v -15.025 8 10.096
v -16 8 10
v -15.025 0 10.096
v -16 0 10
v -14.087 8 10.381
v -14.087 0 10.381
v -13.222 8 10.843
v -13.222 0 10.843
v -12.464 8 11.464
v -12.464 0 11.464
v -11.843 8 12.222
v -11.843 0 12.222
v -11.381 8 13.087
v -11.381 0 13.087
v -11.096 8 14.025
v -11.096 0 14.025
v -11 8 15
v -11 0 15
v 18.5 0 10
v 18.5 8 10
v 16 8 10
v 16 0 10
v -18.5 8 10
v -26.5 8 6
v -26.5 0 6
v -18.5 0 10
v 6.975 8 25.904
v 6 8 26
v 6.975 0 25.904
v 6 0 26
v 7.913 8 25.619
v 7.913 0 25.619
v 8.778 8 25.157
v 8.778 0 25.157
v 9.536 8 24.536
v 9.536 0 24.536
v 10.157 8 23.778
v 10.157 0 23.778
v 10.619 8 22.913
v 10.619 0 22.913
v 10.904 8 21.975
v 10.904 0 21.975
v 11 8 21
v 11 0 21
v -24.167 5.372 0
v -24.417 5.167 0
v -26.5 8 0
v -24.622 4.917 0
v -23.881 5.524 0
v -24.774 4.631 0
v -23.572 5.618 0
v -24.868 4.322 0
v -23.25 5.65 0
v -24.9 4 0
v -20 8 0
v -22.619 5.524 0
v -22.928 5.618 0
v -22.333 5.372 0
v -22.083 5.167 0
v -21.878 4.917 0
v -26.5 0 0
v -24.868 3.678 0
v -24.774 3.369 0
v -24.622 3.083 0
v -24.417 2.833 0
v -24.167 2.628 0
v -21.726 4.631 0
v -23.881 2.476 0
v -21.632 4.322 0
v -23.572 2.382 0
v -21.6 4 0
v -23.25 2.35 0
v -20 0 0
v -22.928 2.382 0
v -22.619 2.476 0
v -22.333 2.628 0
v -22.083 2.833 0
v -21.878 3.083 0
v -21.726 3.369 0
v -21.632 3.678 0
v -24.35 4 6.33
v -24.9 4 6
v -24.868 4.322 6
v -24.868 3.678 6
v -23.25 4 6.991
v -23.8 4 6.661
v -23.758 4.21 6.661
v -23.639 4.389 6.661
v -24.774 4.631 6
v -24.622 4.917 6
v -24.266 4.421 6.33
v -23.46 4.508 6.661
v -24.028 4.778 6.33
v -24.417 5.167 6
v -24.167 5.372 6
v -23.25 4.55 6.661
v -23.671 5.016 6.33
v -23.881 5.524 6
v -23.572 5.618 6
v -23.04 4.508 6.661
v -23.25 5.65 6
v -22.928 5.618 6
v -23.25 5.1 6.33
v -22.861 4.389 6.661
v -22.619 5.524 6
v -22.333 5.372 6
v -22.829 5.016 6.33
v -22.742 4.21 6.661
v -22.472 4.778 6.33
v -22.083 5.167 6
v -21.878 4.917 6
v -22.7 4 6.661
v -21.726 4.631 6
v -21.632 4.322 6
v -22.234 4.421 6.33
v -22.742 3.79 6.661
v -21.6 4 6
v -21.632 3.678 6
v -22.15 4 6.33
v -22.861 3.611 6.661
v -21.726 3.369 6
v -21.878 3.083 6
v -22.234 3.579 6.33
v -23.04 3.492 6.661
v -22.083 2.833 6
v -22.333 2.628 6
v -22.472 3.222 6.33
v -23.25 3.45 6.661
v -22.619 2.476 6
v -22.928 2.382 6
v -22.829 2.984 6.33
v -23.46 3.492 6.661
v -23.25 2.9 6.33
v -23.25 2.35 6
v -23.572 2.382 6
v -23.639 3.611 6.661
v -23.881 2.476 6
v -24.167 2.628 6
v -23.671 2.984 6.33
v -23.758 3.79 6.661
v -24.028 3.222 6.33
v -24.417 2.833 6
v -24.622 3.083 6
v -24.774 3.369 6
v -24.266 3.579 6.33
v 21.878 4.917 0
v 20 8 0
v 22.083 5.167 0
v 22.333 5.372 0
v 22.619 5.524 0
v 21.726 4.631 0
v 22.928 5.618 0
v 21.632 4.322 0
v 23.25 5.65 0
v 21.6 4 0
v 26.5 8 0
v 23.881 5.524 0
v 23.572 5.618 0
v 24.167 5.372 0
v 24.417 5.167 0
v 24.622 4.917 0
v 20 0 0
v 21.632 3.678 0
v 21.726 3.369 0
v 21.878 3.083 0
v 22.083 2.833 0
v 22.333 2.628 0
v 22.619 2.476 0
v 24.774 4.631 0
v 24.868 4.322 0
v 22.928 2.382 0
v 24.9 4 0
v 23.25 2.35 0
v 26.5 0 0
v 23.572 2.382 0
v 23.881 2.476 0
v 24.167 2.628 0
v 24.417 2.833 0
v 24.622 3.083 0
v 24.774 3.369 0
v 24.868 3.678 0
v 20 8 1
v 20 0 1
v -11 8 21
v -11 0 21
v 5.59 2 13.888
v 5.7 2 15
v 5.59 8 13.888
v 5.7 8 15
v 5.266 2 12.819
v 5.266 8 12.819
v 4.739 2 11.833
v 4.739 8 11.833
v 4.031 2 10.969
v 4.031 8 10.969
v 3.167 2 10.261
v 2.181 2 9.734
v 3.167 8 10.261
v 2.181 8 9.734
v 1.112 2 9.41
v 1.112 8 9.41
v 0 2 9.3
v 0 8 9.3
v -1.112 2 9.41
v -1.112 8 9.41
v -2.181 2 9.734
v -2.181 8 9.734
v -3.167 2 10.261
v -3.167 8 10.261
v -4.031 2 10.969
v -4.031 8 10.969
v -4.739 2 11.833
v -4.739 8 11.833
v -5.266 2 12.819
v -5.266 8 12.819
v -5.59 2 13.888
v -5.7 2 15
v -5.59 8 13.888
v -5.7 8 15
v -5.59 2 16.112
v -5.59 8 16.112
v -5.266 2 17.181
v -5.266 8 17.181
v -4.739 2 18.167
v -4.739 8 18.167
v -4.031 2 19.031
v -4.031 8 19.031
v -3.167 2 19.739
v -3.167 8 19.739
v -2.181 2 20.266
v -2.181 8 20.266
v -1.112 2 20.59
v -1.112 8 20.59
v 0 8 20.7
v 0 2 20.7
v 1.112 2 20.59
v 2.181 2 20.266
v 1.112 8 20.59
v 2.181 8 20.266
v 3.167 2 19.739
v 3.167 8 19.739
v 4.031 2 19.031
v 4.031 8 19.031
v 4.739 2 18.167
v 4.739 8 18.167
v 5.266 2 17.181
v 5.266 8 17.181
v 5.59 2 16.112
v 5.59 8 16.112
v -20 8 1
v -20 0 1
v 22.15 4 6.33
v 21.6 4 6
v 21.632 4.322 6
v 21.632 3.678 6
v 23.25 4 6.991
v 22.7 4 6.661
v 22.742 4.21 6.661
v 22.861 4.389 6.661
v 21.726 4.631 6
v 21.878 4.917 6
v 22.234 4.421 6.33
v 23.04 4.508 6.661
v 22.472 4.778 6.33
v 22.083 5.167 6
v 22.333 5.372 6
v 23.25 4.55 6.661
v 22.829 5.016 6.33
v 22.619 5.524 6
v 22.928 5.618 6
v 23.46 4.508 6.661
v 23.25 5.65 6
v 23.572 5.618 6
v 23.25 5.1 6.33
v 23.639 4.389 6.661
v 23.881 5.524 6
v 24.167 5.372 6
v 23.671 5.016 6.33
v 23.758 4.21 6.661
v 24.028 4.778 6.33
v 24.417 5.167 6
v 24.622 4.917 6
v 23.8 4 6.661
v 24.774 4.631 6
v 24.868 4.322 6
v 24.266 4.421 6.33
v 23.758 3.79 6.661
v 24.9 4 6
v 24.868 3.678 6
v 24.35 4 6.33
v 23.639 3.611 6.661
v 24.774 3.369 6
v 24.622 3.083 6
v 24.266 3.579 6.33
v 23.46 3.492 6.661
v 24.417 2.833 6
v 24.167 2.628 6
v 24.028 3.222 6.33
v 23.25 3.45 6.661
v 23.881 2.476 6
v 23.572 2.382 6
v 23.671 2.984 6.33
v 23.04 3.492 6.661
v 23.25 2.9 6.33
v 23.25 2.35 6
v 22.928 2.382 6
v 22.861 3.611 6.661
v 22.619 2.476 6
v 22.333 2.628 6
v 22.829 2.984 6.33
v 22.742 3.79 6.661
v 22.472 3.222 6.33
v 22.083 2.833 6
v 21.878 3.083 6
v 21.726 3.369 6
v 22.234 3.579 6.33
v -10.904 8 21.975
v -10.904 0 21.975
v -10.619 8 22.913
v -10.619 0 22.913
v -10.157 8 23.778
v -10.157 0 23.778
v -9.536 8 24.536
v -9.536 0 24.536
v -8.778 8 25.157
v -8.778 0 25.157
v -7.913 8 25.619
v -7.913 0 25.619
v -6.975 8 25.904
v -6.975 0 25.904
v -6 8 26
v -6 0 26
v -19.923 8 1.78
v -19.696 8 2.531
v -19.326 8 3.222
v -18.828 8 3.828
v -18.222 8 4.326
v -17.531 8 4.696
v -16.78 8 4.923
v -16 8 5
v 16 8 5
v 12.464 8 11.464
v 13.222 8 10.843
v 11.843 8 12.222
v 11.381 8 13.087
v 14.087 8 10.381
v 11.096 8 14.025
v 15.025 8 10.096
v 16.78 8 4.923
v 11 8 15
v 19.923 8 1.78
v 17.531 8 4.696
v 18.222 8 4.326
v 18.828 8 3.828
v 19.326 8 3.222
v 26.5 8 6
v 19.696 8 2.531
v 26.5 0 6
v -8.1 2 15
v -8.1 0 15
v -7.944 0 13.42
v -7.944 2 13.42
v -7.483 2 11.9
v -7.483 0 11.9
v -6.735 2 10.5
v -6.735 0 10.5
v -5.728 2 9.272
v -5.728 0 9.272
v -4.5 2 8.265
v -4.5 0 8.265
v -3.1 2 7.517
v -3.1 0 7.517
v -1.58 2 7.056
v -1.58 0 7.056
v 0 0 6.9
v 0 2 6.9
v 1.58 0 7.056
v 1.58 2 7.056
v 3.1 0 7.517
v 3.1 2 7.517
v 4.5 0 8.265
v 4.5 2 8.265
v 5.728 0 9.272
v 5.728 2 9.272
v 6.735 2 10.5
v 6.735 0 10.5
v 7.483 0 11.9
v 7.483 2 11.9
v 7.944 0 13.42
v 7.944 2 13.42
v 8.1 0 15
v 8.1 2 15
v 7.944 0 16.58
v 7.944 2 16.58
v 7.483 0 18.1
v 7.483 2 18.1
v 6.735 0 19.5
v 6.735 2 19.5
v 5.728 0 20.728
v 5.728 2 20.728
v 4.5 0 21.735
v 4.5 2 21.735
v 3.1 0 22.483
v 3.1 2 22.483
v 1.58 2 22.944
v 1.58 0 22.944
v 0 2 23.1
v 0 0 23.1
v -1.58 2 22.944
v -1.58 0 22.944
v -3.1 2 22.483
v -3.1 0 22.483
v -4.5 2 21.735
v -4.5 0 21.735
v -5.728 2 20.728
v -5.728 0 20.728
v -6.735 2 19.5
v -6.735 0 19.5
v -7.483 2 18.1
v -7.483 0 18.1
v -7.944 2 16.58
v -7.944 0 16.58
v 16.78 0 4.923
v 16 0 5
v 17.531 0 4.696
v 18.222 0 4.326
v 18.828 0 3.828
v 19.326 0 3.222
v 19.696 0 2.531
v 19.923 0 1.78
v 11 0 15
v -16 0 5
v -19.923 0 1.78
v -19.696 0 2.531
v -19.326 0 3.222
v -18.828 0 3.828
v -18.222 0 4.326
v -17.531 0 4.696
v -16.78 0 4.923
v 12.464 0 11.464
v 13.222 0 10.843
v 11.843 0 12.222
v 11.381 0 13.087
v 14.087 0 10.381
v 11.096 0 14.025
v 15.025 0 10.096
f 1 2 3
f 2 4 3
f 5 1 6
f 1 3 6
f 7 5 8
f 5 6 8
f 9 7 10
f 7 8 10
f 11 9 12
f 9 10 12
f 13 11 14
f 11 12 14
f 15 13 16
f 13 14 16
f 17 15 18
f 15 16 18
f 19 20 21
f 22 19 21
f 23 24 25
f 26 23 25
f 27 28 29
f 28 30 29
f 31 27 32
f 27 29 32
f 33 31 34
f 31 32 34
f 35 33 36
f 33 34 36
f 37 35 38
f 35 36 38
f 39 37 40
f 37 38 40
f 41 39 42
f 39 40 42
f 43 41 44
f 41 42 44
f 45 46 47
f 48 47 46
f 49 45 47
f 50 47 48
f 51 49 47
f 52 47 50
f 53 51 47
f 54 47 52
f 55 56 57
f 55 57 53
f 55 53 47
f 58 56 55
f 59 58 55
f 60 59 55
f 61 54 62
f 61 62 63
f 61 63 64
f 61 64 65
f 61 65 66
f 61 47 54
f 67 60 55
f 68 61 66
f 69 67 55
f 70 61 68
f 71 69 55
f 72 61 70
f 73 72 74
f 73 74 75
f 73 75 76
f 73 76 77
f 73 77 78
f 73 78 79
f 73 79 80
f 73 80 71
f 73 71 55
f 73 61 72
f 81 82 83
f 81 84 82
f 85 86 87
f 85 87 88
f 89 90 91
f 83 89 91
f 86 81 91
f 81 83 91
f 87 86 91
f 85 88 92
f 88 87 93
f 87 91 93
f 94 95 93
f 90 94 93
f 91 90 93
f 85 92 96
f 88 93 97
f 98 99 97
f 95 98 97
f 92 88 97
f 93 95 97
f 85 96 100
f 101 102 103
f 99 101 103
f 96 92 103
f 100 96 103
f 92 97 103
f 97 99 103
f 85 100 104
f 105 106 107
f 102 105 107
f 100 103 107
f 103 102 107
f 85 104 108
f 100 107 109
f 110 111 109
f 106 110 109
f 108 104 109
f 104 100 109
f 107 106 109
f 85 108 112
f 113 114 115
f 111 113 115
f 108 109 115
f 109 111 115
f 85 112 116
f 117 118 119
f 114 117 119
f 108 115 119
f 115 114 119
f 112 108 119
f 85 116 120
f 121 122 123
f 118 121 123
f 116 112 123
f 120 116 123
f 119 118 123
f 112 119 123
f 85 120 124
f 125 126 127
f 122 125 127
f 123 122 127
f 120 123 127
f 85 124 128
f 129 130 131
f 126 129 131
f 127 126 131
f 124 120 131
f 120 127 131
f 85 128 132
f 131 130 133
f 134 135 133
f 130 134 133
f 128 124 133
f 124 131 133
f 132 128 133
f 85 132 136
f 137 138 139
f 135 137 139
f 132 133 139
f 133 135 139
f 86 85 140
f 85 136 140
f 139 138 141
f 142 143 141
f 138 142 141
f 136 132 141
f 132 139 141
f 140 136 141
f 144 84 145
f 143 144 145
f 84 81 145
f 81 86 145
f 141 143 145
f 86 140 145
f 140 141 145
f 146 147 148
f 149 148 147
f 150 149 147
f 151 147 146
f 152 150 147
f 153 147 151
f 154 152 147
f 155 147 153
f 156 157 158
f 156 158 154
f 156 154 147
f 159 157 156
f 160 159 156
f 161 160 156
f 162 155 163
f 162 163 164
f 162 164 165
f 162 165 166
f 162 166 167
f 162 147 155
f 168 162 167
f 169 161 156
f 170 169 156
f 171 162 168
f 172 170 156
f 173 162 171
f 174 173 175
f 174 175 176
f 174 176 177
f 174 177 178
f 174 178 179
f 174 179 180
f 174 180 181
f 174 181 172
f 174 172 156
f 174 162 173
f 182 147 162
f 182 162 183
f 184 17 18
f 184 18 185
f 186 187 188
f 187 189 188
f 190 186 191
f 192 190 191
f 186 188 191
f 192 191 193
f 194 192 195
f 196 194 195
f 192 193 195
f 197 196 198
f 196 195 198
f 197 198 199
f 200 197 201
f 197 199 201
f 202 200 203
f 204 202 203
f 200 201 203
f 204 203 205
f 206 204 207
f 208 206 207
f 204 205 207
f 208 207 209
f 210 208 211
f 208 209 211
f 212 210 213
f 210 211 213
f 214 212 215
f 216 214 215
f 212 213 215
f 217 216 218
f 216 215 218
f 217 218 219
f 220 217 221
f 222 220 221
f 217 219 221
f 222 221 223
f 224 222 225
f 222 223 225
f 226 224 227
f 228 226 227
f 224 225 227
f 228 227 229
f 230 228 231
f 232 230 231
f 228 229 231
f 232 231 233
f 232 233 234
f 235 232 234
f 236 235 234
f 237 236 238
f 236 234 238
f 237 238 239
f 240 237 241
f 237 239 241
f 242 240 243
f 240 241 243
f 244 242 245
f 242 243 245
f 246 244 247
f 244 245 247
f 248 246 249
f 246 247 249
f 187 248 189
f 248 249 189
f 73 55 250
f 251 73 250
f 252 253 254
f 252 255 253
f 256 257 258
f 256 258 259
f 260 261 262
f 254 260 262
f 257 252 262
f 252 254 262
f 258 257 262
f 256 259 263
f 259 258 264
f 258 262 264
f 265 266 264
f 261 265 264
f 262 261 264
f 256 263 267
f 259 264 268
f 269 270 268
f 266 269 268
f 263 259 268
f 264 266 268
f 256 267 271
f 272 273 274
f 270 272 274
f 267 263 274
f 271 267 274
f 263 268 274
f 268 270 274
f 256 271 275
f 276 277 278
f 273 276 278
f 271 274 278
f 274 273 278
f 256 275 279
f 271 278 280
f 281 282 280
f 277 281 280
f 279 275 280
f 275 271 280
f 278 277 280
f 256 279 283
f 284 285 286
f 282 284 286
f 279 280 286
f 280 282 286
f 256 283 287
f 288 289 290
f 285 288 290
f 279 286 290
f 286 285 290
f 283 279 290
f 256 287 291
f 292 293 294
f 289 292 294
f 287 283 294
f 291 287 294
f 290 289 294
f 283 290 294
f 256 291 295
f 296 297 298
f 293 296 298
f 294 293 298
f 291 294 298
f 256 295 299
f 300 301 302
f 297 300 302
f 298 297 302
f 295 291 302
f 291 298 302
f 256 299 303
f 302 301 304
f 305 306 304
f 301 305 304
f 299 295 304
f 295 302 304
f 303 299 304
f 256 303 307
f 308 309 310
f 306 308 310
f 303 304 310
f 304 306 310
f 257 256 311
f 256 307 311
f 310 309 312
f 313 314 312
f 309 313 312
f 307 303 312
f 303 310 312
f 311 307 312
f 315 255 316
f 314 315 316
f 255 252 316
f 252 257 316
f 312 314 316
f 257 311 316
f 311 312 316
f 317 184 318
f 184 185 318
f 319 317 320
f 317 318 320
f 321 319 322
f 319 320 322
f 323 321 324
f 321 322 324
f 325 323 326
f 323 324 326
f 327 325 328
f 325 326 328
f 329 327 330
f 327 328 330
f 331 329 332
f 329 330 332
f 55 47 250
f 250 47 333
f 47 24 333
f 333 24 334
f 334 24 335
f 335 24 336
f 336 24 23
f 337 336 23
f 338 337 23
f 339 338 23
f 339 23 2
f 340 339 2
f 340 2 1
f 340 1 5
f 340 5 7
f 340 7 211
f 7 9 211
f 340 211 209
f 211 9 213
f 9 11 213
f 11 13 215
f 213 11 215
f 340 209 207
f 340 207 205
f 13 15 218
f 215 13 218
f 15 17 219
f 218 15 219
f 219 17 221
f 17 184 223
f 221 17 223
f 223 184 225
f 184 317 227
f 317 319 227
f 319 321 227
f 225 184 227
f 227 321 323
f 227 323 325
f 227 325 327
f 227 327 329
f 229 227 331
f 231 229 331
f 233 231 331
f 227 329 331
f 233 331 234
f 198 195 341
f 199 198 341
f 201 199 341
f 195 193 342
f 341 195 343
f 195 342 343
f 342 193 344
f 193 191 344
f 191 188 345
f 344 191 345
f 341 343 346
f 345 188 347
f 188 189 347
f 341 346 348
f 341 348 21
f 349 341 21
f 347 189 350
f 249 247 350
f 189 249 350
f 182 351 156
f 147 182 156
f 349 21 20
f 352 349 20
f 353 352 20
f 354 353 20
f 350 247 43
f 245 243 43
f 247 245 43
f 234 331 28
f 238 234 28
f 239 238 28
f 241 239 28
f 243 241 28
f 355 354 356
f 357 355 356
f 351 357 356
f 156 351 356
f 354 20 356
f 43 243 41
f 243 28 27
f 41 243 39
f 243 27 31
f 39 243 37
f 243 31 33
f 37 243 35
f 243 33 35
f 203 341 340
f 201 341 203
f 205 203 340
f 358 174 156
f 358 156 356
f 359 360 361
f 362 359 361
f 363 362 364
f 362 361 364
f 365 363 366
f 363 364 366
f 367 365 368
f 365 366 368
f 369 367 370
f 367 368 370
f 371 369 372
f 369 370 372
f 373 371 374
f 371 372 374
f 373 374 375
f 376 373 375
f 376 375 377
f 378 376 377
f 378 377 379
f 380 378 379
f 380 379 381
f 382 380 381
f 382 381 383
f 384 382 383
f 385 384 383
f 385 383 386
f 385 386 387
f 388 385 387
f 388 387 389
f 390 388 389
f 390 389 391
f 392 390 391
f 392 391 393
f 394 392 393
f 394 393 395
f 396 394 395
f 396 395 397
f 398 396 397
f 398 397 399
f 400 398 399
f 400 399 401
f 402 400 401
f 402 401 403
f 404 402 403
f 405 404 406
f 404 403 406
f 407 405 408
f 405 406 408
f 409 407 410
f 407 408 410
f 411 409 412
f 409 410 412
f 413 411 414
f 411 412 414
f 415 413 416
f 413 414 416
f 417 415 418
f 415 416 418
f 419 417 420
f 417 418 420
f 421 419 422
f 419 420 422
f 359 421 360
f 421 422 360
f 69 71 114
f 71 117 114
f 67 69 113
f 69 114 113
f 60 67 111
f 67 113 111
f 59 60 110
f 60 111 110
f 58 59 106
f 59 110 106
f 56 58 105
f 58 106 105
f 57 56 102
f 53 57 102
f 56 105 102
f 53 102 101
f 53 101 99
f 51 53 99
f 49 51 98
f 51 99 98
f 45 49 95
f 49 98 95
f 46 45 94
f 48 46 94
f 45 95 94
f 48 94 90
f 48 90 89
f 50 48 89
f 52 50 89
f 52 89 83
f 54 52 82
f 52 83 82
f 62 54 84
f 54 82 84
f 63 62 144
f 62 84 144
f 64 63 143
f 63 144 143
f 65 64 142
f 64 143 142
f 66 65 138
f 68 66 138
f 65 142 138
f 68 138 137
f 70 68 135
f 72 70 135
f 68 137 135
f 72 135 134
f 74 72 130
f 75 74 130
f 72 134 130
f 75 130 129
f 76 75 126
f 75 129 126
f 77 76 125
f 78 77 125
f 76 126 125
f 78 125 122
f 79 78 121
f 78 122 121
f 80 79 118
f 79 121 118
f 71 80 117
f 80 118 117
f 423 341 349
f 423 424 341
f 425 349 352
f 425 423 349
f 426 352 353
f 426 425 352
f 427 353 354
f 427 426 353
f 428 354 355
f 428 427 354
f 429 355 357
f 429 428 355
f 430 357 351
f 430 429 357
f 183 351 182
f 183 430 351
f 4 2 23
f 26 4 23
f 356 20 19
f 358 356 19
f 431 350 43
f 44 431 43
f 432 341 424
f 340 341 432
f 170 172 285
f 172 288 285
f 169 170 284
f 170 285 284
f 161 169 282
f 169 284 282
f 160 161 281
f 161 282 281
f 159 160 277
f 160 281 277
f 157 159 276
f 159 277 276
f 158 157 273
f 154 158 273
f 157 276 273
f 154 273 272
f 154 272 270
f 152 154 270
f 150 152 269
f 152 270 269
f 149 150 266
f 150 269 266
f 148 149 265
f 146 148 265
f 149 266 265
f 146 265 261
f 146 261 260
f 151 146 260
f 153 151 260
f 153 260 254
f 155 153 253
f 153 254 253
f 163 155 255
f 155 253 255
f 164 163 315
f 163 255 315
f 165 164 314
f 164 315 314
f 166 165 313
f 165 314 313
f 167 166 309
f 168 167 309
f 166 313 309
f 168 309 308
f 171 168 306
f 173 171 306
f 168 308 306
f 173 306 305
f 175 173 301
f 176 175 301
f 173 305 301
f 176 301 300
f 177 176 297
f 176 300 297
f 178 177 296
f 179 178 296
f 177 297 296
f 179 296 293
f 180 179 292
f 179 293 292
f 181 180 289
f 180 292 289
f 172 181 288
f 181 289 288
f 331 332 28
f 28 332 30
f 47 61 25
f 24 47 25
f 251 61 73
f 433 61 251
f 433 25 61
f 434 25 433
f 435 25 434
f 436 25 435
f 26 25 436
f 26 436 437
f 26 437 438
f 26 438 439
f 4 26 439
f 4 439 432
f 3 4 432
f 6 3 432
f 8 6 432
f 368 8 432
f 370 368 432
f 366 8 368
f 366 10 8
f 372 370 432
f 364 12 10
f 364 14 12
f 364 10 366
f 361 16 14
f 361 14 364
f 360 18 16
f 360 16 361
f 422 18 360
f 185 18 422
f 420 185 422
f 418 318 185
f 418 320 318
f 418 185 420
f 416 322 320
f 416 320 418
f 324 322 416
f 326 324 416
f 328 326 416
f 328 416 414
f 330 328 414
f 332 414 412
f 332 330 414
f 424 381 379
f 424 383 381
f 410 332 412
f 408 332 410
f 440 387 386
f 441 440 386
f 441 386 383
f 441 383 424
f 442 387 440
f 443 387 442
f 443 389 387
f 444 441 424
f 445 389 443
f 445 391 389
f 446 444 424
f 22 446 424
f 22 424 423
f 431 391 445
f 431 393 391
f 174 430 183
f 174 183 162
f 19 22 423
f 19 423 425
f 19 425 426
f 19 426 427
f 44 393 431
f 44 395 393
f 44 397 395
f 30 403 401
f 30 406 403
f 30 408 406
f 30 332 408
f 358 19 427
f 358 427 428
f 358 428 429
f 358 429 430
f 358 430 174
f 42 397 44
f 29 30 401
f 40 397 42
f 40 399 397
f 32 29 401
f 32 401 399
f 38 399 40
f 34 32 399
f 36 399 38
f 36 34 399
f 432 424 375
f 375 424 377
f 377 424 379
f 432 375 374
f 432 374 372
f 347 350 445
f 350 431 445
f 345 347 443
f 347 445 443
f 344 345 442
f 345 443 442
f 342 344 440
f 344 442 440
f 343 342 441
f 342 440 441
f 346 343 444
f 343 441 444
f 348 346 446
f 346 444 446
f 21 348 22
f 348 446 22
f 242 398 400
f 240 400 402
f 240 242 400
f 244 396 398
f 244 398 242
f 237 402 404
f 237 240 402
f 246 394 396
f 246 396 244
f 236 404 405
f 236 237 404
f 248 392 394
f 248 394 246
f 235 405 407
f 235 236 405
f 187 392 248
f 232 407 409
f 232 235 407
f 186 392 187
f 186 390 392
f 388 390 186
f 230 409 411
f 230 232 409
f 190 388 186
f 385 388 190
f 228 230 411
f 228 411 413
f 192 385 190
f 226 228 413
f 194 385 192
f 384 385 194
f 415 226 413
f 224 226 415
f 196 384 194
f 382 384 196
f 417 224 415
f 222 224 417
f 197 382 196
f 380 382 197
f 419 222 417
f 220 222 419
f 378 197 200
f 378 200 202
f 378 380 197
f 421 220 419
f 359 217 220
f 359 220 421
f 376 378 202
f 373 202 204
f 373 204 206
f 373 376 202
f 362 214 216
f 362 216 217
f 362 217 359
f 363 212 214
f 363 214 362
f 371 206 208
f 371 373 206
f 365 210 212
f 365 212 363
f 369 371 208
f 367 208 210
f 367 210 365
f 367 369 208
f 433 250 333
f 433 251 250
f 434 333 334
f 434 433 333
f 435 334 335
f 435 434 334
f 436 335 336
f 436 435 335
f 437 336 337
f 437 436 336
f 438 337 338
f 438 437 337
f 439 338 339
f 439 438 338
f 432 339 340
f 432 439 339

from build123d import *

# Parameters (mm, degrees)
SKETCH1_W                                = 53
SKETCH1_H                                = 26
BOSS_EXTRUDE1_DEPTH                      = 8
SKETCH2_W                                = 15.5
SKETCH2_H                                = 16
CUT_EXTRUDE1_DEPTH                       = 9
SKETCH3_W                                = 15.5
SKETCH3_H                                = 16
CUT_EXTRUDE2_DEPTH                       = 9
SKETCH4_W                                = 40.000000023
SKETCH4_H                                = 5
CUT_EXTRUDE3_DEPTH                       = 9
CBORE_FOR_M10_HEX_HEAD_BOLT1_D           = 11.4
CBORE_FOR_M10_HEX_HEAD_BOLT1_CBORE_D     = 16.2
CBORE_FOR_M10_HEX_HEAD_BOLT1_CBORE_DEPTH = 2
F_3_3_3_3_DIAMETER_HOLE1_D               = 3.3
F_3_3_3_3_DIAMETER_HOLE1_DEPTH           = 6
F_3_3_3_3_DIAMETER_HOLE1_TIP             = 0.991420021
FILLET1_R                                = 4
FILLET2_R                                = 5
CHAMFER1_SIZE                            = 8
CHAMFER1_SIZE2                           = 4
CHAMFER2_SIZE                            = 4
CHAMFER2_SIZE2                           = 8


with BuildPart() as part:
    # Sketch1 → Boss-Extrude1 (new body)
    with BuildSketch(Plane.XZ):
        with Locations((0, 13)):
            Rectangle(SKETCH1_W, SKETCH1_H)
    extrude(amount=-BOSS_EXTRUDE1_DEPTH)

    # Sketch2 → Cut-Extrude1 (cut, through all)
    with BuildSketch(Plane(origin=(0, 8, 0), x_dir=(-1, 0, 0), z_dir=(0, 1, 0))):
        with Locations((-18.75, 18)):
            Rectangle(SKETCH2_W, SKETCH2_H)
    extrude(amount=-CUT_EXTRUDE1_DEPTH, mode=Mode.SUBTRACT)

    # Sketch3 → Cut-Extrude2 (cut, through all)
    with BuildSketch(Plane(origin=(0, 8, 0), x_dir=(-1, 0, 0), z_dir=(0, 1, 0))):
        with Locations((18.75, 18)):
            Rectangle(SKETCH3_W, SKETCH3_H)
    extrude(amount=-CUT_EXTRUDE2_DEPTH, mode=Mode.SUBTRACT)

    # Sketch4 → Cut-Extrude3 (cut, through all)
    with BuildSketch(Plane(origin=(0, 8, 0), x_dir=(-1, 0, 0), z_dir=(0, 1, 0))):
        with Locations((1.2e-08, 2.5)):
            Rectangle(SKETCH4_W, SKETCH4_H)
    extrude(amount=-CUT_EXTRUDE3_DEPTH, mode=Mode.SUBTRACT)

    # CBORE for M10 Hex Head Bolt1 (through all)
    with Locations(Plane(origin=(0, 0, 0), x_dir=(-1, 0, 0), z_dir=(0, -1, 0))):
        with Locations((0, -15)):
            CounterBoreHole(CBORE_FOR_M10_HEX_HEAD_BOLT1_D / 2, CBORE_FOR_M10_HEX_HEAD_BOLT1_CBORE_D / 2, CBORE_FOR_M10_HEX_HEAD_BOLT1_CBORE_DEPTH)

    # Ø3.3 (3.3) Diameter Hole1
    with Locations(Plane(origin=(0, 0, 0), x_dir=(-1, 0, 0), z_dir=(0, 0, -1))):
        with Locations((-23.25, 4), (23.25, 4)):
            Hole(F_3_3_3_3_DIAMETER_HOLE1_D / 2, depth=F_3_3_3_3_DIAMETER_HOLE1_DEPTH)
            with Locations((0, 0, -(F_3_3_3_3_DIAMETER_HOLE1_DEPTH + F_3_3_3_3_DIAMETER_HOLE1_TIP / 2))):  # 118° drill point
                Cone(0, F_3_3_3_3_DIAMETER_HOLE1_D / 2, F_3_3_3_3_DIAMETER_HOLE1_TIP, mode=Mode.SUBTRACT)

    # Fillet1
    fillet1_edges = [part.edges().sort_by_distance(p)[0] for p in [
        (20, 4, 5),
        (-20.000000023, 4, 5),
    ]]
    fillet(fillet1_edges, radius=FILLET1_R)

    # Fillet2
    fillet2_edges = [part.edges().sort_by_distance(p)[0] for p in [
        (11, 4, 10),
        (11, 4, 26),
        (-11, 4, 26),
        (-11, 4, 10),
    ]]
    fillet(fillet2_edges, radius=FILLET2_R)

    # Chamfer1
    chamfer1_edges = [part.edges().sort_by_distance(p)[0] for p in [
        (-26.5, 4, 10),
    ]]
    chamfer1_side = [part.faces().sort_by_distance(p)[0] for p in [
        (-21.25, 4, 10),
    ]]
    chamfer(chamfer1_edges, length=CHAMFER1_SIZE, length2=CHAMFER1_SIZE2, reference=chamfer1_side[0])

    # Chamfer2
    chamfer2_edges = [part.edges().sort_by_distance(p)[0] for p in [
        (26.5, 4, 10),
    ]]
    chamfer2_side = [part.faces().sort_by_distance(p)[0] for p in [
        (26.5, 4, 5),
    ]]
    chamfer(chamfer2_edges, length=CHAMFER2_SIZE, length2=CHAMFER2_SIZE2, reference=chamfer2_side[0])


solid = part.part
